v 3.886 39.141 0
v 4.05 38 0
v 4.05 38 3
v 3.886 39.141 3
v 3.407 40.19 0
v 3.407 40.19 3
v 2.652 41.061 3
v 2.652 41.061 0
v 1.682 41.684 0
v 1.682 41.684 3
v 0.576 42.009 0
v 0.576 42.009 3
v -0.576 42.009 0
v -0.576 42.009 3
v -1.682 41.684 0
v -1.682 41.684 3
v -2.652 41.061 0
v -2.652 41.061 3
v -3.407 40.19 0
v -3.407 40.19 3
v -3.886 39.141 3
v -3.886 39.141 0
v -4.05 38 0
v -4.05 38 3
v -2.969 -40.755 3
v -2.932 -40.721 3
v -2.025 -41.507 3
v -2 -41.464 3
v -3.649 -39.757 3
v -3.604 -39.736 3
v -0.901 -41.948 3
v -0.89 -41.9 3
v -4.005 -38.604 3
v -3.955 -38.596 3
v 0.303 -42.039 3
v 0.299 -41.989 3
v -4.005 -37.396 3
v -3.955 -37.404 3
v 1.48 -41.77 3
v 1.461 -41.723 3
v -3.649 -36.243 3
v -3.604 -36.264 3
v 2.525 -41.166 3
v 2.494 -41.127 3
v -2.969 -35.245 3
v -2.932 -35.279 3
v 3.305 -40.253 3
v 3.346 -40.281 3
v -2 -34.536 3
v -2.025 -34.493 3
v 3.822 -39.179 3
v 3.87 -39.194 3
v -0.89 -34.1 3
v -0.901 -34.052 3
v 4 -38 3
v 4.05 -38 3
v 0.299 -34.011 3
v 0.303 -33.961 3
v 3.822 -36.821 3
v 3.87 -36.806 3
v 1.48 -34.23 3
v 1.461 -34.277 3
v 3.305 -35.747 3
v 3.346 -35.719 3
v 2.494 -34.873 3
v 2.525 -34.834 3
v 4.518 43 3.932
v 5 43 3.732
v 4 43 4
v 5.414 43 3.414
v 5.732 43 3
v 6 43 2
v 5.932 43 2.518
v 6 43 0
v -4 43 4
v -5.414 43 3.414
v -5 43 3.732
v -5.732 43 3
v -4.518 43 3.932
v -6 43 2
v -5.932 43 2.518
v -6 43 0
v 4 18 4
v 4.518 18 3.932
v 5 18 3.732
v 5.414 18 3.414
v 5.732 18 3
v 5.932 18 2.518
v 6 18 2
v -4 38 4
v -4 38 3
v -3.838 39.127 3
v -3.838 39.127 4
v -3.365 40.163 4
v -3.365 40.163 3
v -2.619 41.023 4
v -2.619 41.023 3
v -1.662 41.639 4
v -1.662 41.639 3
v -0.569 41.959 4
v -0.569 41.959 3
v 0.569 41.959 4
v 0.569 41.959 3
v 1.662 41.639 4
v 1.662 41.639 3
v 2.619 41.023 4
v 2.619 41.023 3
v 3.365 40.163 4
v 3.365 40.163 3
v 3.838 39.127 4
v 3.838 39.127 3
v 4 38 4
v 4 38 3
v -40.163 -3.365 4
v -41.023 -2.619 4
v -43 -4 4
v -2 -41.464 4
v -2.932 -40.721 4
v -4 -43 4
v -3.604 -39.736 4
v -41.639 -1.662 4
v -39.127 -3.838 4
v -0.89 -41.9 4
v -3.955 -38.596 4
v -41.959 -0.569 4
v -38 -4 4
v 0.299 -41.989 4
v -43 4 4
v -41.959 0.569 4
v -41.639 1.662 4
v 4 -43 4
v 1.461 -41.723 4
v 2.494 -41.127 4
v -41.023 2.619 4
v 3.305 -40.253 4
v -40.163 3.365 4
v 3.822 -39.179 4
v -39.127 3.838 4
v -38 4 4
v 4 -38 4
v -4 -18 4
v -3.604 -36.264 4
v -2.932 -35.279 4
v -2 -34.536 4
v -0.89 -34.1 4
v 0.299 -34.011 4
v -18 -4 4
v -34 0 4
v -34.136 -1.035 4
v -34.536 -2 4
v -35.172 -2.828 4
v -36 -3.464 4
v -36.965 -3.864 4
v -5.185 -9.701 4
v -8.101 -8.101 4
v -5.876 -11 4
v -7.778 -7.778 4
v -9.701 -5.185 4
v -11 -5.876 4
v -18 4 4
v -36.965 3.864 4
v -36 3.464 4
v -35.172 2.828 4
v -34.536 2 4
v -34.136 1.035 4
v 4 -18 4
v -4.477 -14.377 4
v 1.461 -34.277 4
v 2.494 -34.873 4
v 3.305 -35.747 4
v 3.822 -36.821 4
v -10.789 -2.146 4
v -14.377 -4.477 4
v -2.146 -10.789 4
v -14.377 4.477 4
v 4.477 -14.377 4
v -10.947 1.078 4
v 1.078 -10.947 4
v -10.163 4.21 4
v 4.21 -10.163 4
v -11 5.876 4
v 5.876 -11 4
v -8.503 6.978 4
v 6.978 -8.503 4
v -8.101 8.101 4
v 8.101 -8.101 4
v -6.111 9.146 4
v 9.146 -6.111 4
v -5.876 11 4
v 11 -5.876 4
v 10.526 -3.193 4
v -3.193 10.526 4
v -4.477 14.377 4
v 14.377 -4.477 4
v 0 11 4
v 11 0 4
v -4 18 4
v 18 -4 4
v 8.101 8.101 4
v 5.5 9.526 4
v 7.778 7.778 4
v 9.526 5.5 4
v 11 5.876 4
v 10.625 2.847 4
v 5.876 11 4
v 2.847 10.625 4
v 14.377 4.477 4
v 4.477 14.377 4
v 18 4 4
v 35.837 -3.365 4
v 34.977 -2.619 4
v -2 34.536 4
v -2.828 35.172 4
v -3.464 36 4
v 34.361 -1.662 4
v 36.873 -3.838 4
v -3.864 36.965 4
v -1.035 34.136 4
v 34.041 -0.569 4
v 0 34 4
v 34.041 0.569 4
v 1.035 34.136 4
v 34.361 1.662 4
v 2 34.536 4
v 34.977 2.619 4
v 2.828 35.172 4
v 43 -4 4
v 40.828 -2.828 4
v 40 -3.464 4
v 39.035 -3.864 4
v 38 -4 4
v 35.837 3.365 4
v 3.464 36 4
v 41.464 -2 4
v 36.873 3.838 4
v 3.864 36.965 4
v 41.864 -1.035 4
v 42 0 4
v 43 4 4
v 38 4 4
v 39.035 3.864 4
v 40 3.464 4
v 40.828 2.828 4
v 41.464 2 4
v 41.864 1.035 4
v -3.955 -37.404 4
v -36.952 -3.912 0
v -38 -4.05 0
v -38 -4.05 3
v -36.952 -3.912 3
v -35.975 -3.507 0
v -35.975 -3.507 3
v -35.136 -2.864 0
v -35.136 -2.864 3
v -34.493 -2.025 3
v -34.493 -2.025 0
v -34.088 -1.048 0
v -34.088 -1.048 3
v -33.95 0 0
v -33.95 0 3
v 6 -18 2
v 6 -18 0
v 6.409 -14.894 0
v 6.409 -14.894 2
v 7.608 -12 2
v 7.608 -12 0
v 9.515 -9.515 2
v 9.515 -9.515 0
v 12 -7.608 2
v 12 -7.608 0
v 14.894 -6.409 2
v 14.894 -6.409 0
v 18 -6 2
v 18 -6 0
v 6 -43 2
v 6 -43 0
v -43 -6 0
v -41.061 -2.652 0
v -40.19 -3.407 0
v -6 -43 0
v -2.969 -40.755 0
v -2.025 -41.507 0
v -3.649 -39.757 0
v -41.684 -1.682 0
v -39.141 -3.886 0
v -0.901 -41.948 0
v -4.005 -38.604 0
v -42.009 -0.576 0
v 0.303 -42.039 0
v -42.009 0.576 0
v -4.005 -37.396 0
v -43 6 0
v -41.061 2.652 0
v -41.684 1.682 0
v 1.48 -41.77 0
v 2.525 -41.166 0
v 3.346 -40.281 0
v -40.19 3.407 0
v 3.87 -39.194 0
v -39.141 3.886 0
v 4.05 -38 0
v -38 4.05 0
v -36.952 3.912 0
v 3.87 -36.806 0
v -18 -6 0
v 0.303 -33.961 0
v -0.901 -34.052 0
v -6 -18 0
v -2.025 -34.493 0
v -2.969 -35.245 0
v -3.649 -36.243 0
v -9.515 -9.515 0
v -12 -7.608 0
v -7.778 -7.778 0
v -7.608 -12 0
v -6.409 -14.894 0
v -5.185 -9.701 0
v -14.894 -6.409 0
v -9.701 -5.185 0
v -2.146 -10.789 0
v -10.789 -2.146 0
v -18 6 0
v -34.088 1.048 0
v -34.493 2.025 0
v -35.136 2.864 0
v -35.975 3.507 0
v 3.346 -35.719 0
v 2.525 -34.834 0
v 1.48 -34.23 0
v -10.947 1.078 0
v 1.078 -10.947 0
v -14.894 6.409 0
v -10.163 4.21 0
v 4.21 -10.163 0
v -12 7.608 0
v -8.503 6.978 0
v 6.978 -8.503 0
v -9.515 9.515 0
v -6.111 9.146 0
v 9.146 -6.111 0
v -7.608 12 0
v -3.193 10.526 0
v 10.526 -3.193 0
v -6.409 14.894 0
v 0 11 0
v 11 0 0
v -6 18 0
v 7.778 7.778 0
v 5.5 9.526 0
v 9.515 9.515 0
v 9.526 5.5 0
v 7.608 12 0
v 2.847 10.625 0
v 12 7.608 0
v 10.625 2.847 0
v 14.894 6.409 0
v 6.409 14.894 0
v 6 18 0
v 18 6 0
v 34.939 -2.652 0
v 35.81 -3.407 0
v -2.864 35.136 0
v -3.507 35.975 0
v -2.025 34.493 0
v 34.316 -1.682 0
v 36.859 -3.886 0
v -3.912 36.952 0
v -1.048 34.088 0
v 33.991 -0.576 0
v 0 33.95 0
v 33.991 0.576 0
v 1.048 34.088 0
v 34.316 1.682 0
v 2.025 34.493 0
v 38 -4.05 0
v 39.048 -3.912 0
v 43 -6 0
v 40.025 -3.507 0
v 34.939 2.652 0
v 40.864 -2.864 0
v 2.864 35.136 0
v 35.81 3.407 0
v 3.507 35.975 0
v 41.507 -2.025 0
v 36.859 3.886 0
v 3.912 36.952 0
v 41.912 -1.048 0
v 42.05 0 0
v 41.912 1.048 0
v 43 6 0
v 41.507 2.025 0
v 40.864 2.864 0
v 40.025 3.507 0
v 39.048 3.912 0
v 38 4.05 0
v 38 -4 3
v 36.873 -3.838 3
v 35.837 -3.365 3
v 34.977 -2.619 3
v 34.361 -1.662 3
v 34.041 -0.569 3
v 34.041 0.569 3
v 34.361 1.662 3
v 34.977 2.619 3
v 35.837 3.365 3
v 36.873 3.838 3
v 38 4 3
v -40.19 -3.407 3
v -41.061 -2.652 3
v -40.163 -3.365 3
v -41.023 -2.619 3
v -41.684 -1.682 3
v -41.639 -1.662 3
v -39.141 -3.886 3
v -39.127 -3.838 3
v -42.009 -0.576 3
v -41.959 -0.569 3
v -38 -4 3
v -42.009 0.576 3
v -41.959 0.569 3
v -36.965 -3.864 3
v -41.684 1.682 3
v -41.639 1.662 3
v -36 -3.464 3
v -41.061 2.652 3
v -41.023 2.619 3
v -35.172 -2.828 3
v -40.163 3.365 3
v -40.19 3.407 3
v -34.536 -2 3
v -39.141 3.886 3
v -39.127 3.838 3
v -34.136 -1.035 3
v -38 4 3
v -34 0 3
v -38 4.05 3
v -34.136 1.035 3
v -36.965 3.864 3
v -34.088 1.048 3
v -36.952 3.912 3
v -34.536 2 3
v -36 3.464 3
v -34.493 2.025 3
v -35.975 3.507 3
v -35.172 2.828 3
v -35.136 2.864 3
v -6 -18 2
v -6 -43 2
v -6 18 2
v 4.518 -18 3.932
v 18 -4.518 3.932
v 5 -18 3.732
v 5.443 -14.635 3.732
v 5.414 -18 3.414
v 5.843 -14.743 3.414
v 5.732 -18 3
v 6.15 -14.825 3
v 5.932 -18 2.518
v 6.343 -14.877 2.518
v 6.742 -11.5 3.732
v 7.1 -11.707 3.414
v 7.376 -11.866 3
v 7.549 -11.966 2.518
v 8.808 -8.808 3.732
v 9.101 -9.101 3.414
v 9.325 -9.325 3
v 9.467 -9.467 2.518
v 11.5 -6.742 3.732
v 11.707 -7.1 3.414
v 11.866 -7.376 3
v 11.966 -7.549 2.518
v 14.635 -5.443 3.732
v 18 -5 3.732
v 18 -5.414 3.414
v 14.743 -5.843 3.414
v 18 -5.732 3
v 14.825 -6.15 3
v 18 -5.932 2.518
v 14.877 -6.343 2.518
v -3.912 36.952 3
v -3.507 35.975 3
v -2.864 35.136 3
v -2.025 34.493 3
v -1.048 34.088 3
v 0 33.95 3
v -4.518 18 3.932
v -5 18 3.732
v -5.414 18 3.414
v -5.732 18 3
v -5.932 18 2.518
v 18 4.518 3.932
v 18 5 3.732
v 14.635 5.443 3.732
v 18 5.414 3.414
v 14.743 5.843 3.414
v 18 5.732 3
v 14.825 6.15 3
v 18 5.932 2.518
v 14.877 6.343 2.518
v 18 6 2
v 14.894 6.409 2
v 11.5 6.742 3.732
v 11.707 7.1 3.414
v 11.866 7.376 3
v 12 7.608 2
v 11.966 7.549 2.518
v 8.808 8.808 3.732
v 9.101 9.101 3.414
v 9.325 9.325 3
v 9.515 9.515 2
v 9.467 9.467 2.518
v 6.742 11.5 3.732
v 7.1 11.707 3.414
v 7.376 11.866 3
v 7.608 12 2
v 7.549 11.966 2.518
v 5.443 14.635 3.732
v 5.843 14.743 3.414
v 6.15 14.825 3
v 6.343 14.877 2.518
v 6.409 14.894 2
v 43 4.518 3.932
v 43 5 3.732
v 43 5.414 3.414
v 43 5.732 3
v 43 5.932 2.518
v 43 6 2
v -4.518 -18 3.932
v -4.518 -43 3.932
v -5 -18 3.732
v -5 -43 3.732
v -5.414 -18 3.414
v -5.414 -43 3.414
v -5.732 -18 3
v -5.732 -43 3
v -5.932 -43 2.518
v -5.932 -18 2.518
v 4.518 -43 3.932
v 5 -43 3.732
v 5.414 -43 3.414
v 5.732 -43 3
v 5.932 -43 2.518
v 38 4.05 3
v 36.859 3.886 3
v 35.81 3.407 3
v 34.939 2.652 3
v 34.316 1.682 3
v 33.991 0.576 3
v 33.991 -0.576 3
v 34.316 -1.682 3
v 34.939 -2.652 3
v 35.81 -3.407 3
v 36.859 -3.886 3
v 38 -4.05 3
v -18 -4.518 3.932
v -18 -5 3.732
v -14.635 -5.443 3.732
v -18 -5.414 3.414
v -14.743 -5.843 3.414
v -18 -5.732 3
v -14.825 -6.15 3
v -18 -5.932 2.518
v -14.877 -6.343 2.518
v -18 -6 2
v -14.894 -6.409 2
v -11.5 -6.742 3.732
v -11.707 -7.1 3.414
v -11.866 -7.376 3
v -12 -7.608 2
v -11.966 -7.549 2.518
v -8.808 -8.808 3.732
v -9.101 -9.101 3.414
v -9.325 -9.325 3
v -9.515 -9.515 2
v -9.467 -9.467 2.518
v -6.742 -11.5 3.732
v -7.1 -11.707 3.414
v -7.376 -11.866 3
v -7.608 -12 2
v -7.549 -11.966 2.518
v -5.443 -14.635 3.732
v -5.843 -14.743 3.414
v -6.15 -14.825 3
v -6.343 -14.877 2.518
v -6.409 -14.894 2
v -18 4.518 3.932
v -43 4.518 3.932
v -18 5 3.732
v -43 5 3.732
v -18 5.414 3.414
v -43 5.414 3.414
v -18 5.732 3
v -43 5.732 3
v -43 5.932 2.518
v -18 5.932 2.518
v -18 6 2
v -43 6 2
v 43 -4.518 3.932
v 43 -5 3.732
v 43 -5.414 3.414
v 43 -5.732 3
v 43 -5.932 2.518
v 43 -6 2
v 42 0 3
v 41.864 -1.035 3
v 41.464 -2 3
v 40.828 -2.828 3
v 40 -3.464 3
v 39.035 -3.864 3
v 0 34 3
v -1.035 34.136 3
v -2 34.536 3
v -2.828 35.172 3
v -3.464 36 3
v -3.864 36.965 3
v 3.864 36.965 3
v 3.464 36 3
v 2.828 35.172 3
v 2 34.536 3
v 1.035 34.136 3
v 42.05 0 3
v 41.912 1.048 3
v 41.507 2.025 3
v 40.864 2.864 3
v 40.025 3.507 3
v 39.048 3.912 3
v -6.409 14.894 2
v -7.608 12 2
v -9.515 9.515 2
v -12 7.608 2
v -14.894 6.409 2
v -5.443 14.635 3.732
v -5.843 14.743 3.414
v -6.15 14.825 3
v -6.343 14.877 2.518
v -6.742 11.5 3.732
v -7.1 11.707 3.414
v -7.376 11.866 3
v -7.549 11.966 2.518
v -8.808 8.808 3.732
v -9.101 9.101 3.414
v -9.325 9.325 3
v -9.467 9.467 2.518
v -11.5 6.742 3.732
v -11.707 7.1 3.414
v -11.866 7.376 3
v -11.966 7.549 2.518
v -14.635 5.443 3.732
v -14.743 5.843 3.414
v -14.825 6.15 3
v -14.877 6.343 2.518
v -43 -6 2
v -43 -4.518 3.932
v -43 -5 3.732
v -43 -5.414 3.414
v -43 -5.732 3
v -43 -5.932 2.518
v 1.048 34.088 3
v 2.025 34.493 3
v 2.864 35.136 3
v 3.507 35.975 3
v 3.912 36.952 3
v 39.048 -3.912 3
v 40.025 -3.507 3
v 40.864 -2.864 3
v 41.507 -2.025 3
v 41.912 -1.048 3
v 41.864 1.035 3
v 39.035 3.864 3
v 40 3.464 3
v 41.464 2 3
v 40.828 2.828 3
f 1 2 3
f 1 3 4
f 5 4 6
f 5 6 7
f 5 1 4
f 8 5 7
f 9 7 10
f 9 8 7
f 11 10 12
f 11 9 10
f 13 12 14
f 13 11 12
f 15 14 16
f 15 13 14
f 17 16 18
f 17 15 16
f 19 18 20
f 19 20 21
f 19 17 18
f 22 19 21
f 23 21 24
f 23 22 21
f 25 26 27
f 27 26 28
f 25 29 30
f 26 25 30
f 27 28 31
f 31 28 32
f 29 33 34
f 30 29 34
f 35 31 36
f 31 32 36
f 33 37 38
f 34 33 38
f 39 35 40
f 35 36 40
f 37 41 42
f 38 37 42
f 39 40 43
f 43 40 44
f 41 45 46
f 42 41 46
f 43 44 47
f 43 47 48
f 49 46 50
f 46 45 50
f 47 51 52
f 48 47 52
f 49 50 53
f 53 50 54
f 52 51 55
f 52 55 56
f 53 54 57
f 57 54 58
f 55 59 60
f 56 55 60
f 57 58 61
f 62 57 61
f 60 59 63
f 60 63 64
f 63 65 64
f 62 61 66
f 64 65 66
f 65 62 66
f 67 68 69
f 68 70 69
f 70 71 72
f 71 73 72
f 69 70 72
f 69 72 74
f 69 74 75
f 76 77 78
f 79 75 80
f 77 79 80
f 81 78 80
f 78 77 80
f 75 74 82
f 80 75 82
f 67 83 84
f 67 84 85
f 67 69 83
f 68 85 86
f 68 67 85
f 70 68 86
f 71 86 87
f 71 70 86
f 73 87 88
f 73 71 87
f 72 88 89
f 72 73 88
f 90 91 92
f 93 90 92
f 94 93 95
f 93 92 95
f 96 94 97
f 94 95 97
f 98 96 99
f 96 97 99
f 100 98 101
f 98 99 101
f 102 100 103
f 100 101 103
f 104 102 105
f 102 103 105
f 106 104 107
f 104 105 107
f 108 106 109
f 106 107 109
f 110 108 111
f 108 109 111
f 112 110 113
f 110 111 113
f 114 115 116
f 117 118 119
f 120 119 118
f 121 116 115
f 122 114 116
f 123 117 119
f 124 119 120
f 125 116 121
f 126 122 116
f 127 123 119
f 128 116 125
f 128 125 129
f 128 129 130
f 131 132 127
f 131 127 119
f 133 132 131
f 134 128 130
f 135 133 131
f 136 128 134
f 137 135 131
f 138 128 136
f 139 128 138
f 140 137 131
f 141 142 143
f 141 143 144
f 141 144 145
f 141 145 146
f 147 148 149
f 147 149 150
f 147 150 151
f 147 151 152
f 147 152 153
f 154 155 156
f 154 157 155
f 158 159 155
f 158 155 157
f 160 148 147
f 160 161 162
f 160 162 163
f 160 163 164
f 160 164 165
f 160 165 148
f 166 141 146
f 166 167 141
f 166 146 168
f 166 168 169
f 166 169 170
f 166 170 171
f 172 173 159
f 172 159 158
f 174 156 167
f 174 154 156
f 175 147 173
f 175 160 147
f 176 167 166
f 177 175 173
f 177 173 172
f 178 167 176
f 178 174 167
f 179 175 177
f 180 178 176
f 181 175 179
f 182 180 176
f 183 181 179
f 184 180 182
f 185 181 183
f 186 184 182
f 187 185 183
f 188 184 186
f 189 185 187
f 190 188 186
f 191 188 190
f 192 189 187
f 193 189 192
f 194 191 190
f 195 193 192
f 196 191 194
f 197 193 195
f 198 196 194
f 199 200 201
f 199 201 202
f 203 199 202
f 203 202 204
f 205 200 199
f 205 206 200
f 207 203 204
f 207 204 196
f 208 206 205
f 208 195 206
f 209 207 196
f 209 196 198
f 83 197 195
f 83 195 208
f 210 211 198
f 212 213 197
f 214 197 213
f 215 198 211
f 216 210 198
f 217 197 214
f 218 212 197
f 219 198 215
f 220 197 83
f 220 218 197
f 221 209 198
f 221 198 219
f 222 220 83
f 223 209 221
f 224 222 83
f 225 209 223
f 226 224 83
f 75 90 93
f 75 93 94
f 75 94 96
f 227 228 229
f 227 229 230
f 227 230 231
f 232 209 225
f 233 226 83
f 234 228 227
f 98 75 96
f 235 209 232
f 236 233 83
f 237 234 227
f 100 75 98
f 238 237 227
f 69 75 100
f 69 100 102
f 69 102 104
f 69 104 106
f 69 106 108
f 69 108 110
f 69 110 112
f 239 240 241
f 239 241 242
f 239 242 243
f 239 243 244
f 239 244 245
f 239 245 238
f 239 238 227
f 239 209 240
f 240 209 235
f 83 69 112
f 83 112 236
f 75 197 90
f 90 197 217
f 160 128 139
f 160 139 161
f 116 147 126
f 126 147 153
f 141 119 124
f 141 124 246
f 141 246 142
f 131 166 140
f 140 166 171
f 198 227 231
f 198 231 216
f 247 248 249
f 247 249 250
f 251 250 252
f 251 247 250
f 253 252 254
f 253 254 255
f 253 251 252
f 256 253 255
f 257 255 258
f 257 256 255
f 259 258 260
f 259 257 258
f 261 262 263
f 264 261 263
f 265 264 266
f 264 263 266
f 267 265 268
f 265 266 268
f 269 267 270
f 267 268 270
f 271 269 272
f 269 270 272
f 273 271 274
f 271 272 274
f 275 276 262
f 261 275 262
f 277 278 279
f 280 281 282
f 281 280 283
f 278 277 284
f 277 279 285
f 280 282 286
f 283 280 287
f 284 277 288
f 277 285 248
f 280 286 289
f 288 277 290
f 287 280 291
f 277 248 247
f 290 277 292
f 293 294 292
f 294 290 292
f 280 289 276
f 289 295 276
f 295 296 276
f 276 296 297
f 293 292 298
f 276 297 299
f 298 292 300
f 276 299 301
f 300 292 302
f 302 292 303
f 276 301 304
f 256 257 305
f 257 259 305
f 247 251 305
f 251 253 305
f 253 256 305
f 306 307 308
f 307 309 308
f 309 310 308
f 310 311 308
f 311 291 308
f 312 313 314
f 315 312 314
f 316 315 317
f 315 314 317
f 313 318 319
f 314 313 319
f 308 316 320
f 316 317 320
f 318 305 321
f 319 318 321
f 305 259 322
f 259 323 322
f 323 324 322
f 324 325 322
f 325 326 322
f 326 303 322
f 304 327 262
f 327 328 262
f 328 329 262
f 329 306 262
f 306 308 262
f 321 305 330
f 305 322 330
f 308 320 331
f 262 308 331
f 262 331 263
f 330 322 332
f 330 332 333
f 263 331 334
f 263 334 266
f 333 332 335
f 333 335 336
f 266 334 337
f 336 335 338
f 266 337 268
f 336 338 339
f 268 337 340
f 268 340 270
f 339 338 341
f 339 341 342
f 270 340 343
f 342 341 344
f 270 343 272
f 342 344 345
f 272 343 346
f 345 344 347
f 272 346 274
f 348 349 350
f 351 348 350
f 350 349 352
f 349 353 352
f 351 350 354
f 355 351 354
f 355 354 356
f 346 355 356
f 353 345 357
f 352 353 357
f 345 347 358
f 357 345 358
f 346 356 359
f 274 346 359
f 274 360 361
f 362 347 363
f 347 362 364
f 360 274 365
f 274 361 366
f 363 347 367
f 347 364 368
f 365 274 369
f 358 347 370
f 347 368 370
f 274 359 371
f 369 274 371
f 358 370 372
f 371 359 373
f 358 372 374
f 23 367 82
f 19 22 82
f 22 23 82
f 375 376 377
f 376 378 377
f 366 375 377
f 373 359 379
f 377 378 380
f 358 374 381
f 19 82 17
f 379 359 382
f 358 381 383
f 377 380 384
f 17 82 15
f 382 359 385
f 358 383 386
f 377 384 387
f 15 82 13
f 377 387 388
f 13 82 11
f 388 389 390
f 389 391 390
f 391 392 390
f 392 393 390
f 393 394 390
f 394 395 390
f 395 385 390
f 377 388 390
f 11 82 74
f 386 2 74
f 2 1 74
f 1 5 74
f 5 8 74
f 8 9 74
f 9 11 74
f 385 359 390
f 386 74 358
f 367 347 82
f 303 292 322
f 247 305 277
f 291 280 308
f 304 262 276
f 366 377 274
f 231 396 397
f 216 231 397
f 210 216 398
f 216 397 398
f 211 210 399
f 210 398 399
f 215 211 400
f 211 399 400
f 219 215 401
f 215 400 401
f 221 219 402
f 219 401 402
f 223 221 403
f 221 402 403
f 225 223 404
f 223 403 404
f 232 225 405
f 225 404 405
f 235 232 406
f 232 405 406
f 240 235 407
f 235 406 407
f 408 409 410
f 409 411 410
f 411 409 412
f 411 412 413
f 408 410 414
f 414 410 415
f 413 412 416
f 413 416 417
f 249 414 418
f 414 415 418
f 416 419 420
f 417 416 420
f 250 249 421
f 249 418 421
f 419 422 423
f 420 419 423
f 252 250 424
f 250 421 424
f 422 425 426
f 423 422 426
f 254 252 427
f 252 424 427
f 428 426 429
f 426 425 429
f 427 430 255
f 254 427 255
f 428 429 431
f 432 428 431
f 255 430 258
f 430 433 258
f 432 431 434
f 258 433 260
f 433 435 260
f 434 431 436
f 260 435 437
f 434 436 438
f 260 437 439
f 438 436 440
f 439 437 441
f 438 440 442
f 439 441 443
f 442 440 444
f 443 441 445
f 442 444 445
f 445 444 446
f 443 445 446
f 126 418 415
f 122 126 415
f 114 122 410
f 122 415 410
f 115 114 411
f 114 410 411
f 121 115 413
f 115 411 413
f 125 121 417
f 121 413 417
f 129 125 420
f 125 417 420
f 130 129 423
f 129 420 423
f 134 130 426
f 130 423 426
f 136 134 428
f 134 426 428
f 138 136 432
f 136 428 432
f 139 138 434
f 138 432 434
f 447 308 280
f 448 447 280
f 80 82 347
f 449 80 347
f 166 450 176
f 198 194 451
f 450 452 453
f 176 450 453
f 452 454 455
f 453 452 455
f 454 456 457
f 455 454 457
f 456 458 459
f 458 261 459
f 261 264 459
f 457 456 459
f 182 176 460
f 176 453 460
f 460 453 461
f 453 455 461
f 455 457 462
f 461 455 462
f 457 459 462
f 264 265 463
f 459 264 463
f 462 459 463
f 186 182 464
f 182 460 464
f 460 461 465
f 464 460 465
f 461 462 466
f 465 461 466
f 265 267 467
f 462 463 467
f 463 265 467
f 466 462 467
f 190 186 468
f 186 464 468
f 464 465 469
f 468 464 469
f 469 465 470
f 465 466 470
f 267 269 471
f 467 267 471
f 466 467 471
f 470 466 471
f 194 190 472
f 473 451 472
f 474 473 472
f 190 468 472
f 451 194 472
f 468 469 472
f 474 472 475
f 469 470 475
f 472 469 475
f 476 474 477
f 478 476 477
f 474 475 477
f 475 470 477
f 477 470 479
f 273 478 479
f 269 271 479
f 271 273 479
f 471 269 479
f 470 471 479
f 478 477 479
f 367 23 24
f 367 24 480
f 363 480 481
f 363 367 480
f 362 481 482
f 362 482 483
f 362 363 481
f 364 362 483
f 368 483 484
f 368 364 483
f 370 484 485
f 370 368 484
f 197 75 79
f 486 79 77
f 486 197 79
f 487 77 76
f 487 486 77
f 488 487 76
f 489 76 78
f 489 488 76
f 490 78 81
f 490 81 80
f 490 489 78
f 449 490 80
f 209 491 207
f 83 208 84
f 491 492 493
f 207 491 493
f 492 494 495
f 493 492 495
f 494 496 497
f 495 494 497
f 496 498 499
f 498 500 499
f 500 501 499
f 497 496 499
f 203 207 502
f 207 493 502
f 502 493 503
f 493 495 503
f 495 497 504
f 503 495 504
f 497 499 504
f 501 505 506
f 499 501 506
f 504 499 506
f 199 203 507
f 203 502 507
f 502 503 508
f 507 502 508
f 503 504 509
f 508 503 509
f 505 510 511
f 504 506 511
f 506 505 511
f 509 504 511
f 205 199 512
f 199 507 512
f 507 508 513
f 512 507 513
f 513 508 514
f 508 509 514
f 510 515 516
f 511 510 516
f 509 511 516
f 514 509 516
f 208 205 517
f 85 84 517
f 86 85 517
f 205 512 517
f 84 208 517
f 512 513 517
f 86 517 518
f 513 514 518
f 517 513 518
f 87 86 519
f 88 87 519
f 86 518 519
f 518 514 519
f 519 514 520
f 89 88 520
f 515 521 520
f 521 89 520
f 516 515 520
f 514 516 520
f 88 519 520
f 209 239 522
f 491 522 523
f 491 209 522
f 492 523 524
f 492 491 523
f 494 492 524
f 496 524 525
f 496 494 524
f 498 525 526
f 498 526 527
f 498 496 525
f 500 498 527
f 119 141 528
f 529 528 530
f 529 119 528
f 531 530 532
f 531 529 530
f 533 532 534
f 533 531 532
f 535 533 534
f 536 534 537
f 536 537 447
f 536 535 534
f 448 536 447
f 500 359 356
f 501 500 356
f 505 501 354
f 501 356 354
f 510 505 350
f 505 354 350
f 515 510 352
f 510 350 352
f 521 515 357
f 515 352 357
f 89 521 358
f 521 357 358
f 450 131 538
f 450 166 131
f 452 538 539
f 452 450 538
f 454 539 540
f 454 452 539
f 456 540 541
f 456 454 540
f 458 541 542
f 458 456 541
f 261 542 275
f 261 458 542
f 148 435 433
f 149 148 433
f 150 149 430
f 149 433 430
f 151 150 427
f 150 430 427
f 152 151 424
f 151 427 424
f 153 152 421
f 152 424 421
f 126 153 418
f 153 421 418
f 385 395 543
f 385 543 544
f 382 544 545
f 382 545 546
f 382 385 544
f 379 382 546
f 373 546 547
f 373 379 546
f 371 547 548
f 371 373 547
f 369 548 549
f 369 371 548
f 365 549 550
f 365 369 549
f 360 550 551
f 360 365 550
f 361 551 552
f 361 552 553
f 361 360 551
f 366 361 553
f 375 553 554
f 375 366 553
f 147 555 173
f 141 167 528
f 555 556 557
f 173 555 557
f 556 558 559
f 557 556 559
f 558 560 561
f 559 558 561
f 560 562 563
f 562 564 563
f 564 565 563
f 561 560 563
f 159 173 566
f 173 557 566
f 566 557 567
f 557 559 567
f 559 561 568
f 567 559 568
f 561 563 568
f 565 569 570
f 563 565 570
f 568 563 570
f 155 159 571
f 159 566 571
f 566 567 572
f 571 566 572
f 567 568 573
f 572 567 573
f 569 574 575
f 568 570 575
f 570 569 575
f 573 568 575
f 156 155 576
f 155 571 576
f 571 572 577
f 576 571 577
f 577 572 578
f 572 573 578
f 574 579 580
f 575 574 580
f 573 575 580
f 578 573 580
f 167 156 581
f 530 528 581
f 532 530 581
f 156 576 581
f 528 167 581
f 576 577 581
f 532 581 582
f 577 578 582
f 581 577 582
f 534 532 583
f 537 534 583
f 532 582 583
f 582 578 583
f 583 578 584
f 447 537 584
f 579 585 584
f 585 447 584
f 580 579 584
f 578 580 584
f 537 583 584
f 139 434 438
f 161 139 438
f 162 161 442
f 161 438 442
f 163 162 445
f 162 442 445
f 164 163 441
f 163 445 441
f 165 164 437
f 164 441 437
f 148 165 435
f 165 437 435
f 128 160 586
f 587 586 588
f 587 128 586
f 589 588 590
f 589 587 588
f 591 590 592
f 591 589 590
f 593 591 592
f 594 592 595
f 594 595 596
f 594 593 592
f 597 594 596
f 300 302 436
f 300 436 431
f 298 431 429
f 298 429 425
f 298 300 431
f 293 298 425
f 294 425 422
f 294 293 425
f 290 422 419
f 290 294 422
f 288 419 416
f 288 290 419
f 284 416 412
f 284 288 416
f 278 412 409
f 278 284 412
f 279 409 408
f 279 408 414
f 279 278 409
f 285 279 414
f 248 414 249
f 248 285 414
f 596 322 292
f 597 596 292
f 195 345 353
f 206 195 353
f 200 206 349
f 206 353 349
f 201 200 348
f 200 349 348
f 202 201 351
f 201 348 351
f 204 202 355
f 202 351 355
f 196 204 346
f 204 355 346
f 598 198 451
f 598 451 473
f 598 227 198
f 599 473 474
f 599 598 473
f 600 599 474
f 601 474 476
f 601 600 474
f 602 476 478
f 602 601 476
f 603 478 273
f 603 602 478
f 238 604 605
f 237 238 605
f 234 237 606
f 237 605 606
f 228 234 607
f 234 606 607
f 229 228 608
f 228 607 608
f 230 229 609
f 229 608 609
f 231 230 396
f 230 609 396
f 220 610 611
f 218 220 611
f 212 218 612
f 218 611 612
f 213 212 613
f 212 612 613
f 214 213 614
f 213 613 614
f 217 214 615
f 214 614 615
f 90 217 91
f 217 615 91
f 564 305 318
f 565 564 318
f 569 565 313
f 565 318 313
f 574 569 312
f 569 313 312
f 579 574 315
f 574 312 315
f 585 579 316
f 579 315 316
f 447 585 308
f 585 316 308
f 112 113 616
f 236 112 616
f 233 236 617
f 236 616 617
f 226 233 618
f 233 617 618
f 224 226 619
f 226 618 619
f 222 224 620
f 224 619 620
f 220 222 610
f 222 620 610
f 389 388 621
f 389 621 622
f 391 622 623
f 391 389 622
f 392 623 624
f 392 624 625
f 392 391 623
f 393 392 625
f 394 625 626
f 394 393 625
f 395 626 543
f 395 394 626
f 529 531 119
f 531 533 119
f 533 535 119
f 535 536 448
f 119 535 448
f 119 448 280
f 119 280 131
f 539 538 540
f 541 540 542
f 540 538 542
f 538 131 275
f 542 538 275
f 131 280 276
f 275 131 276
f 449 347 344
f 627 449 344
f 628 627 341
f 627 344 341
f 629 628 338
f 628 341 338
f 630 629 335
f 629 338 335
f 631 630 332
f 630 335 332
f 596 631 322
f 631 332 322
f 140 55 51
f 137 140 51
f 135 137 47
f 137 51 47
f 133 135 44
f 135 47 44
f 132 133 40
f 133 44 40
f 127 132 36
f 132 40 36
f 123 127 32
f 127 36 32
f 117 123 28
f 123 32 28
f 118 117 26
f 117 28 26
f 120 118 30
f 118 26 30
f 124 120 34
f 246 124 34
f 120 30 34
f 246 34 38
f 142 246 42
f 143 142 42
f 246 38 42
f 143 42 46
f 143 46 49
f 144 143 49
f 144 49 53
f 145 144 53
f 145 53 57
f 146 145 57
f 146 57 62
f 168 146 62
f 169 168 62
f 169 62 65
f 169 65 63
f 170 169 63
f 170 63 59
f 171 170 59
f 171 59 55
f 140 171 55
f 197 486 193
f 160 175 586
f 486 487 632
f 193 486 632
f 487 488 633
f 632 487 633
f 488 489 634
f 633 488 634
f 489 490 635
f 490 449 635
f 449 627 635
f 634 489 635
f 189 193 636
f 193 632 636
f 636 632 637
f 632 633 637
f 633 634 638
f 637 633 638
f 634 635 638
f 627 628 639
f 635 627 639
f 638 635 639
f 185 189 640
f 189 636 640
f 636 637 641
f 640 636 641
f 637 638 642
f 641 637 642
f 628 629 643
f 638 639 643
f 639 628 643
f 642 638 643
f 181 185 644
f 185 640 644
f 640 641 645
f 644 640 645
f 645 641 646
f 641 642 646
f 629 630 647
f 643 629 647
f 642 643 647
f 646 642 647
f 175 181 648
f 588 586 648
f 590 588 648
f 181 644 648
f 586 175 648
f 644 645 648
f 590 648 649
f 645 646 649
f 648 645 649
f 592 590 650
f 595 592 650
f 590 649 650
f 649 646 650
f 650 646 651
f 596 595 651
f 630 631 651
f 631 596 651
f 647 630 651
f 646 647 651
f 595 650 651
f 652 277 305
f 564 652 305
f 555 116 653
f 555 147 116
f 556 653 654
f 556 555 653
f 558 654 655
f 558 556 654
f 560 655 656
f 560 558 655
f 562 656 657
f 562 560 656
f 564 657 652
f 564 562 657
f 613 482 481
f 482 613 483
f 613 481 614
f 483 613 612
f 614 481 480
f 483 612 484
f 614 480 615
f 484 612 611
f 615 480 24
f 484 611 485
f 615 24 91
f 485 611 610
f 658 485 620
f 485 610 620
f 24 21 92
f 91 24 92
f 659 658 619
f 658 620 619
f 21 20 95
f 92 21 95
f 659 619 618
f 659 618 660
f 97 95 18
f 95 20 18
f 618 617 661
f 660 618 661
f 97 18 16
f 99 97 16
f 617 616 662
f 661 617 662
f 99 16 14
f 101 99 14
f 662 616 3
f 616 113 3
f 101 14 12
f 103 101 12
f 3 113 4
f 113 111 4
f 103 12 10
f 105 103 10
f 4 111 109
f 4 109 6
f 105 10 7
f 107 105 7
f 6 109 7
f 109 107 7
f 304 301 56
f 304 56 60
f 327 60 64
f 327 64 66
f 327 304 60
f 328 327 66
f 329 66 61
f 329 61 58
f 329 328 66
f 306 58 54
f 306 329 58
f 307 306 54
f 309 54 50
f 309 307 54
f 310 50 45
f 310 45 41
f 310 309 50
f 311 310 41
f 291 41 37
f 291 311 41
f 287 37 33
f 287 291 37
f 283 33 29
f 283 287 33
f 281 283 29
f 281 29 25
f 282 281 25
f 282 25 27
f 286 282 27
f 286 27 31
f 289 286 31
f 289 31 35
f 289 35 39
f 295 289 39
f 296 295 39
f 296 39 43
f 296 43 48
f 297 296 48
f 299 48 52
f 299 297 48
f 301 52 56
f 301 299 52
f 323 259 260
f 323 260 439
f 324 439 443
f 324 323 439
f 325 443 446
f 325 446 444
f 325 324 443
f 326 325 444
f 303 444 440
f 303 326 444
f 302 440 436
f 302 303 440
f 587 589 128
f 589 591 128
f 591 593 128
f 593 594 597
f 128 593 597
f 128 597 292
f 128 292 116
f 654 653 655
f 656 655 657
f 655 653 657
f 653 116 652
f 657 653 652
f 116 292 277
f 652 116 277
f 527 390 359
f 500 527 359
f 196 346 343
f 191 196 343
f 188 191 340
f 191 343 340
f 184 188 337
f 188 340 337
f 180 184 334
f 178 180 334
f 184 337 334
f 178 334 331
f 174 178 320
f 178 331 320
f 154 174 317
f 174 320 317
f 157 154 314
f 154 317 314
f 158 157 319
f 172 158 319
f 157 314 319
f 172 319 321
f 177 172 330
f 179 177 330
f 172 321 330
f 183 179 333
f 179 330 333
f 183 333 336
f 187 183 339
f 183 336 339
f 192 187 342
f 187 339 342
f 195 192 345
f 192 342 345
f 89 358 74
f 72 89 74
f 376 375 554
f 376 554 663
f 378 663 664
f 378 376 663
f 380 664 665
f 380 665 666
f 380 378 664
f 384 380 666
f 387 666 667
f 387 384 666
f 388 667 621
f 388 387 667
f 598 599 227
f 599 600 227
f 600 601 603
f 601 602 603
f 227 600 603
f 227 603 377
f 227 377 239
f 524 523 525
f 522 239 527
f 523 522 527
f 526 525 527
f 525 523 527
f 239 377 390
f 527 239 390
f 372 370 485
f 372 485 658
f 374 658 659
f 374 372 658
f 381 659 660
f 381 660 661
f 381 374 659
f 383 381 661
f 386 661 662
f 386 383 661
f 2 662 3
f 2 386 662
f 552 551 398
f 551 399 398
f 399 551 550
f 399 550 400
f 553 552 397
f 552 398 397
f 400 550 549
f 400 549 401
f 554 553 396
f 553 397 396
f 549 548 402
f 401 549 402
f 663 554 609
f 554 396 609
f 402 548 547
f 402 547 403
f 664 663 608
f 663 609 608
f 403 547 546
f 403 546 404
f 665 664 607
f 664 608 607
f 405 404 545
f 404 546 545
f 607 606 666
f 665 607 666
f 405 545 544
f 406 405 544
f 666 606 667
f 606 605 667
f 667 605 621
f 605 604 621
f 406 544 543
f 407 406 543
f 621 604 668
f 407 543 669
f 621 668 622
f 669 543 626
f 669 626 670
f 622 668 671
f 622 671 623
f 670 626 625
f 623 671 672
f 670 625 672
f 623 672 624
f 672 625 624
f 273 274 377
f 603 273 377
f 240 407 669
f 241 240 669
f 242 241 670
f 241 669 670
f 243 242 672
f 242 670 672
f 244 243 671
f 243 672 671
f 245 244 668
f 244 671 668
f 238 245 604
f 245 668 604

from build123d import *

# Parameters (mm, degrees)
F1_DEPTH = 4
F2_DEPTH = 3
F3_R     = 1.99999


# Not quite as in the source:
# - a fillet or chamfer is up to 0.001 mm smaller than in the source, because OpenCascade refuses the exact size
# - a feature names something its author has since deleted; it is built from what else it names


with BuildPart() as f1:
    # F0 (on Top) → F1 (new body)
    with BuildSketch(Plane.XY):
        with BuildLine():
            ThreePointArc((-4.05, 38), (0, 42.05), (4.05, 38))
            Line((4.05, 38), (6, 38))
            Line((6, 38), (6, 43))
            Line((6, 43), (-6, 43))
            Line((-6, 43), (-6, 38))
            Line((-6, 38), (-4.05, 38))
        make_face()
        with BuildLine():
            Line((6, 38), (4.05, 38))
            ThreePointArc((4.05, 38), (2.8637824638, 35.1362175362), (0, 33.95))
            ThreePointArc((0, 33.95), (-2.8637824638, 35.1362175362), (-4.05, 38))
            Line((-4.05, 38), (-6, 38))
            Line((-6, 38), (-6, 18))
            ThreePointArc((-6, 18), (-9.5147186258, 9.5147186258), (-18, 6))
            Line((-18, 6), (-38, 6))
            Line((-38, 6), (-38, 4.05))
            ThreePointArc((-38, 4.05), (-35.1362175362, 2.8637824638), (-33.95, 0))
            ThreePointArc((-33.95, 0), (-35.1362175362, -2.8637824638), (-38, -4.05))
            Line((-38, -4.05), (-38, -6))
            Line((-38, -6), (-18, -6))
            ThreePointArc((-18, -6), (-9.5147186258, -9.5147186258), (-6, -18))
            Line((-6, -18), (-6, -38))
            Line((-6, -38), (-4.05, -38))
            ThreePointArc((-4.05, -38), (0, -33.95), (4.05, -38))
            Line((4.05, -38), (6, -38))
            Line((6, -38), (6, -18))
            ThreePointArc((6, -18), (9.5147186258, -9.5147186258), (18, -6))
            Line((18, -6), (38, -6))
            Line((38, -6), (38, -4.05))
            ThreePointArc((38, -4.05), (33.95, 0), (38, 4.05))
            Line((38, 4.05), (38, 6))
            Line((38, 6), (18, 6))
            ThreePointArc((18, 6), (9.5147186258, 9.5147186258), (6, 18))
            Line((6, 18), (6, 38))
        make_face()
        with BuildLine():
            ThreePointArc((11, 0), (-7.7781745931, -7.7781745931), (0, 11))
            ThreePointArc((0, 11), (7.7781745931, 7.7781745931), (11, 0))
        make_face(mode=Mode.SUBTRACT)
        with BuildLine():
            Line((43, 6), (38, 6))
            Line((38, 6), (38, 4.05))
            ThreePointArc((38, 4.05), (40.8637824638, 2.8637824638), (42.05, 0))
            ThreePointArc((42.05, 0), (40.8637824638, -2.8637824638), (38, -4.05))
            Line((38, -4.05), (38, -6))
            Line((38, -6), (43, -6))
            Line((43, -6), (43, 6))
        make_face()
        with BuildLine():
            Line((6, -43), (6, -38))
            Line((6, -38), (4.05, -38))
            ThreePointArc((4.05, -38), (0, -42.05), (-4.05, -38))
            Line((-4.05, -38), (-6, -38))
            Line((-6, -38), (-6, -43))
            Line((-6, -43), (6, -43))
        make_face()
        with BuildLine():
            Line((-38, 4.05), (-38, 6))
            Line((-38, 6), (-43, 6))
            Line((-43, 6), (-43, -6))
            Line((-43, -6), (-38, -6))
            Line((-38, -6), (-38, -4.05))
            ThreePointArc((-38, -4.05), (-42.05, 0), (-38, 4.05))
        make_face()
        with BuildLine():
            Line((38, 4), (38, 4.05))
            ThreePointArc((38, 4.05), (33.95, 0), (38, -4.05))
            Line((38, -4.05), (38, -4))
            ThreePointArc((38, -4), (34, 0), (38, 4))
        make_face()
        with BuildLine():
            ThreePointArc((42.05, 0), (40.8637824638, 2.8637824638), (38, 4.05))
            Line((38, 4.05), (38, 4))
            ThreePointArc((38, 4), (40.8284271247, 2.8284271247), (42, 0))
            ThreePointArc((42, 0), (40.8284271247, -2.8284271247), (38, -4))
            Line((38, -4), (38, -4.05))
            ThreePointArc((38, -4.05), (40.8637824638, -2.8637824638), (42.05, 0))
        make_face()
        with BuildLine():
            Line((0, 33.95), (0, 34))
            ThreePointArc((0, 34), (-2.8284271247, 35.1715728753), (-4, 38))
            Line((-4, 38), (-4.05, 38))
            ThreePointArc((-4.05, 38), (-2.8637824638, 35.1362175362), (0, 33.95))
        make_face()
        with BuildLine():
            ThreePointArc((-33.95, 0), (-35.1362175362, 2.8637824638), (-38, 4.05))
            Line((-38, 4.05), (-38, 4))
            ThreePointArc((-38, 4), (-35.1715728753, 2.8284271247), (-34, 0))
            ThreePointArc((-34, 0), (-35.1715728753, -2.8284271247), (-38, -4))
            Line((-38, -4), (-38, -4.05))
            ThreePointArc((-38, -4.05), (-35.1362175362, -2.8637824638), (-33.95, 0))
        make_face()
        with BuildLine():
            Line((-38, 4), (-38, 4.05))
            ThreePointArc((-38, 4.05), (-42.05, 0), (-38, -4.05))
            Line((-38, -4.05), (-38, -4))
            ThreePointArc((-38, -4), (-42, 0), (-38, 4))
        make_face()
        with BuildLine():
            ThreePointArc((-4, 38), (0, 42), (4, 38))
            Line((4, 38), (4.05, 38))
            ThreePointArc((4.05, 38), (0, 42.05), (-4.05, 38))
            Line((-4.05, 38), (-4, 38))
        make_face()
        with BuildLine():
            Line((4.05, 38), (4, 38))
            ThreePointArc((4, 38), (2.8284271247, 35.1715728753), (0, 34))
            Line((0, 34), (0, 33.95))
            ThreePointArc((0, 33.95), (2.8637824638, 35.1362175362), (4.05, 38))
        make_face()
        with BuildLine():
            Line((4, -38), (4.05, -38))
            ThreePointArc((4.05, -38), (0, -33.95), (-4.05, -38))
            Line((-4.05, -38), (-4, -38))
            ThreePointArc((-4, -38), (0, -34), (4, -38))
        make_face()
        with BuildLine():
            ThreePointArc((-4.05, -38), (0, -42.05), (4.05, -38))
            Line((4.05, -38), (4, -38))
            ThreePointArc((4, -38), (0, -42), (-4, -38))
            Line((-4, -38), (-4.05, -38))
        make_face()
    extrude(amount=F1_DEPTH)

    # F0 (on Top) → F2 (cut)
    with BuildSketch(Plane.XY):
        with BuildLine():
            ThreePointArc((-4.05, -38), (0, -42.05), (4.05, -38))
            Line((4.05, -38), (4, -38))
            ThreePointArc((4, -38), (0, -42), (-4, -38))
            Line((-4, -38), (-4.05, -38))
        make_face()
        with BuildLine():
            Line((4, -38), (4.05, -38))
            ThreePointArc((4.05, -38), (0, -33.95), (-4.05, -38))
            Line((-4.05, -38), (-4, -38))
            ThreePointArc((-4, -38), (0, -34), (4, -38))
        make_face()
        with BuildLine():
            ThreePointArc((42.05, 0), (40.8637824638, 2.8637824638), (38, 4.05))
            Line((38, 4.05), (38, 4))
            ThreePointArc((38, 4), (40.8284271247, 2.8284271247), (42, 0))
            ThreePointArc((42, 0), (40.8284271247, -2.8284271247), (38, -4))
            Line((38, -4), (38, -4.05))
            ThreePointArc((38, -4.05), (40.8637824638, -2.8637824638), (42.05, 0))
        make_face()
        with BuildLine():
            ThreePointArc((42, 0), (40.8284271247, 2.8284271247), (38, 4))
            Line((38, 4), (38, 0))
            Line((38, 0), (38, -4))
            ThreePointArc((38, -4), (40.8284271247, -2.8284271247), (42, 0))
        make_face()
        with BuildLine():
            Line((38, 4), (38, 4.05))
            ThreePointArc((38, 4.05), (33.95, 0), (38, -4.05))
            Line((38, -4.05), (38, -4))
            ThreePointArc((38, -4), (34, 0), (38, 4))
        make_face()
        with BuildLine():
            Line((38, 0), (38, 4))
            ThreePointArc((38, 4), (34, 0), (38, -4))
            Line((38, -4), (38, 0))
        make_face()
        with BuildLine():
            ThreePointArc((-4, 38), (0, 42), (4, 38))
            Line((4, 38), (4.05, 38))
            ThreePointArc((4.05, 38), (0, 42.05), (-4.05, 38))
            Line((-4.05, 38), (-4, 38))
        make_face()
        with BuildLine():
            Line((4.05, 38), (4, 38))
            ThreePointArc((4, 38), (2.8284271247, 35.1715728753), (0, 34))
            Line((0, 34), (0, 33.95))
            ThreePointArc((0, 33.95), (2.8637824638, 35.1362175362), (4.05, 38))
        make_face()
        with BuildLine():
            Line((0, 33.95), (0, 34))
            ThreePointArc((0, 34), (-2.8284271247, 35.1715728753), (-4, 38))
            Line((-4, 38), (-4.05, 38))
            ThreePointArc((-4.05, 38), (-2.8637824638, 35.1362175362), (0, 33.95))
        make_face()
        with BuildLine():
            Line((0, 34), (0, 38))
            Line((0, 38), (-4, 38))
            ThreePointArc((-4, 38), (-2.8284271247, 35.1715728753), (0, 34))
        make_face()
        with BuildLine():
            Line((-38, 4), (-38, 4.05))
            ThreePointArc((-38, 4.05), (-42.05, 0), (-38, -4.05))
            Line((-38, -4.05), (-38, -4))
            ThreePointArc((-38, -4), (-42, 0), (-38, 4))
        make_face()
        with BuildLine():
            ThreePointArc((-33.95, 0), (-35.1362175362, 2.8637824638), (-38, 4.05))
            Line((-38, 4.05), (-38, 4))
            ThreePointArc((-38, 4), (-35.1715728753, 2.8284271247), (-34, 0))
            ThreePointArc((-34, 0), (-35.1715728753, -2.8284271247), (-38, -4))
            Line((-38, -4), (-38, -4.05))
            ThreePointArc((-38, -4.05), (-35.1362175362, -2.8637824638), (-33.95, 0))
        make_face()
    extrude(amount=F2_DEPTH, mode=Mode.SUBTRACT)

    # F3 (radius 2 in the source; OpenCascade refuses exactly that, so slightly less here)
    f3_edges = [f1.edges().sort_by_distance(p)[0] for p in [
        (-6, 30.5, 4),
        (6, 30.5, 4),
        (30.5, -6, 4),
        (9.514719, -9.514719, 4),
        (-9.514719, -9.514719, 4),
    ]]
    fillet(f3_edges, radius=F3_R)


solid = f1.part
